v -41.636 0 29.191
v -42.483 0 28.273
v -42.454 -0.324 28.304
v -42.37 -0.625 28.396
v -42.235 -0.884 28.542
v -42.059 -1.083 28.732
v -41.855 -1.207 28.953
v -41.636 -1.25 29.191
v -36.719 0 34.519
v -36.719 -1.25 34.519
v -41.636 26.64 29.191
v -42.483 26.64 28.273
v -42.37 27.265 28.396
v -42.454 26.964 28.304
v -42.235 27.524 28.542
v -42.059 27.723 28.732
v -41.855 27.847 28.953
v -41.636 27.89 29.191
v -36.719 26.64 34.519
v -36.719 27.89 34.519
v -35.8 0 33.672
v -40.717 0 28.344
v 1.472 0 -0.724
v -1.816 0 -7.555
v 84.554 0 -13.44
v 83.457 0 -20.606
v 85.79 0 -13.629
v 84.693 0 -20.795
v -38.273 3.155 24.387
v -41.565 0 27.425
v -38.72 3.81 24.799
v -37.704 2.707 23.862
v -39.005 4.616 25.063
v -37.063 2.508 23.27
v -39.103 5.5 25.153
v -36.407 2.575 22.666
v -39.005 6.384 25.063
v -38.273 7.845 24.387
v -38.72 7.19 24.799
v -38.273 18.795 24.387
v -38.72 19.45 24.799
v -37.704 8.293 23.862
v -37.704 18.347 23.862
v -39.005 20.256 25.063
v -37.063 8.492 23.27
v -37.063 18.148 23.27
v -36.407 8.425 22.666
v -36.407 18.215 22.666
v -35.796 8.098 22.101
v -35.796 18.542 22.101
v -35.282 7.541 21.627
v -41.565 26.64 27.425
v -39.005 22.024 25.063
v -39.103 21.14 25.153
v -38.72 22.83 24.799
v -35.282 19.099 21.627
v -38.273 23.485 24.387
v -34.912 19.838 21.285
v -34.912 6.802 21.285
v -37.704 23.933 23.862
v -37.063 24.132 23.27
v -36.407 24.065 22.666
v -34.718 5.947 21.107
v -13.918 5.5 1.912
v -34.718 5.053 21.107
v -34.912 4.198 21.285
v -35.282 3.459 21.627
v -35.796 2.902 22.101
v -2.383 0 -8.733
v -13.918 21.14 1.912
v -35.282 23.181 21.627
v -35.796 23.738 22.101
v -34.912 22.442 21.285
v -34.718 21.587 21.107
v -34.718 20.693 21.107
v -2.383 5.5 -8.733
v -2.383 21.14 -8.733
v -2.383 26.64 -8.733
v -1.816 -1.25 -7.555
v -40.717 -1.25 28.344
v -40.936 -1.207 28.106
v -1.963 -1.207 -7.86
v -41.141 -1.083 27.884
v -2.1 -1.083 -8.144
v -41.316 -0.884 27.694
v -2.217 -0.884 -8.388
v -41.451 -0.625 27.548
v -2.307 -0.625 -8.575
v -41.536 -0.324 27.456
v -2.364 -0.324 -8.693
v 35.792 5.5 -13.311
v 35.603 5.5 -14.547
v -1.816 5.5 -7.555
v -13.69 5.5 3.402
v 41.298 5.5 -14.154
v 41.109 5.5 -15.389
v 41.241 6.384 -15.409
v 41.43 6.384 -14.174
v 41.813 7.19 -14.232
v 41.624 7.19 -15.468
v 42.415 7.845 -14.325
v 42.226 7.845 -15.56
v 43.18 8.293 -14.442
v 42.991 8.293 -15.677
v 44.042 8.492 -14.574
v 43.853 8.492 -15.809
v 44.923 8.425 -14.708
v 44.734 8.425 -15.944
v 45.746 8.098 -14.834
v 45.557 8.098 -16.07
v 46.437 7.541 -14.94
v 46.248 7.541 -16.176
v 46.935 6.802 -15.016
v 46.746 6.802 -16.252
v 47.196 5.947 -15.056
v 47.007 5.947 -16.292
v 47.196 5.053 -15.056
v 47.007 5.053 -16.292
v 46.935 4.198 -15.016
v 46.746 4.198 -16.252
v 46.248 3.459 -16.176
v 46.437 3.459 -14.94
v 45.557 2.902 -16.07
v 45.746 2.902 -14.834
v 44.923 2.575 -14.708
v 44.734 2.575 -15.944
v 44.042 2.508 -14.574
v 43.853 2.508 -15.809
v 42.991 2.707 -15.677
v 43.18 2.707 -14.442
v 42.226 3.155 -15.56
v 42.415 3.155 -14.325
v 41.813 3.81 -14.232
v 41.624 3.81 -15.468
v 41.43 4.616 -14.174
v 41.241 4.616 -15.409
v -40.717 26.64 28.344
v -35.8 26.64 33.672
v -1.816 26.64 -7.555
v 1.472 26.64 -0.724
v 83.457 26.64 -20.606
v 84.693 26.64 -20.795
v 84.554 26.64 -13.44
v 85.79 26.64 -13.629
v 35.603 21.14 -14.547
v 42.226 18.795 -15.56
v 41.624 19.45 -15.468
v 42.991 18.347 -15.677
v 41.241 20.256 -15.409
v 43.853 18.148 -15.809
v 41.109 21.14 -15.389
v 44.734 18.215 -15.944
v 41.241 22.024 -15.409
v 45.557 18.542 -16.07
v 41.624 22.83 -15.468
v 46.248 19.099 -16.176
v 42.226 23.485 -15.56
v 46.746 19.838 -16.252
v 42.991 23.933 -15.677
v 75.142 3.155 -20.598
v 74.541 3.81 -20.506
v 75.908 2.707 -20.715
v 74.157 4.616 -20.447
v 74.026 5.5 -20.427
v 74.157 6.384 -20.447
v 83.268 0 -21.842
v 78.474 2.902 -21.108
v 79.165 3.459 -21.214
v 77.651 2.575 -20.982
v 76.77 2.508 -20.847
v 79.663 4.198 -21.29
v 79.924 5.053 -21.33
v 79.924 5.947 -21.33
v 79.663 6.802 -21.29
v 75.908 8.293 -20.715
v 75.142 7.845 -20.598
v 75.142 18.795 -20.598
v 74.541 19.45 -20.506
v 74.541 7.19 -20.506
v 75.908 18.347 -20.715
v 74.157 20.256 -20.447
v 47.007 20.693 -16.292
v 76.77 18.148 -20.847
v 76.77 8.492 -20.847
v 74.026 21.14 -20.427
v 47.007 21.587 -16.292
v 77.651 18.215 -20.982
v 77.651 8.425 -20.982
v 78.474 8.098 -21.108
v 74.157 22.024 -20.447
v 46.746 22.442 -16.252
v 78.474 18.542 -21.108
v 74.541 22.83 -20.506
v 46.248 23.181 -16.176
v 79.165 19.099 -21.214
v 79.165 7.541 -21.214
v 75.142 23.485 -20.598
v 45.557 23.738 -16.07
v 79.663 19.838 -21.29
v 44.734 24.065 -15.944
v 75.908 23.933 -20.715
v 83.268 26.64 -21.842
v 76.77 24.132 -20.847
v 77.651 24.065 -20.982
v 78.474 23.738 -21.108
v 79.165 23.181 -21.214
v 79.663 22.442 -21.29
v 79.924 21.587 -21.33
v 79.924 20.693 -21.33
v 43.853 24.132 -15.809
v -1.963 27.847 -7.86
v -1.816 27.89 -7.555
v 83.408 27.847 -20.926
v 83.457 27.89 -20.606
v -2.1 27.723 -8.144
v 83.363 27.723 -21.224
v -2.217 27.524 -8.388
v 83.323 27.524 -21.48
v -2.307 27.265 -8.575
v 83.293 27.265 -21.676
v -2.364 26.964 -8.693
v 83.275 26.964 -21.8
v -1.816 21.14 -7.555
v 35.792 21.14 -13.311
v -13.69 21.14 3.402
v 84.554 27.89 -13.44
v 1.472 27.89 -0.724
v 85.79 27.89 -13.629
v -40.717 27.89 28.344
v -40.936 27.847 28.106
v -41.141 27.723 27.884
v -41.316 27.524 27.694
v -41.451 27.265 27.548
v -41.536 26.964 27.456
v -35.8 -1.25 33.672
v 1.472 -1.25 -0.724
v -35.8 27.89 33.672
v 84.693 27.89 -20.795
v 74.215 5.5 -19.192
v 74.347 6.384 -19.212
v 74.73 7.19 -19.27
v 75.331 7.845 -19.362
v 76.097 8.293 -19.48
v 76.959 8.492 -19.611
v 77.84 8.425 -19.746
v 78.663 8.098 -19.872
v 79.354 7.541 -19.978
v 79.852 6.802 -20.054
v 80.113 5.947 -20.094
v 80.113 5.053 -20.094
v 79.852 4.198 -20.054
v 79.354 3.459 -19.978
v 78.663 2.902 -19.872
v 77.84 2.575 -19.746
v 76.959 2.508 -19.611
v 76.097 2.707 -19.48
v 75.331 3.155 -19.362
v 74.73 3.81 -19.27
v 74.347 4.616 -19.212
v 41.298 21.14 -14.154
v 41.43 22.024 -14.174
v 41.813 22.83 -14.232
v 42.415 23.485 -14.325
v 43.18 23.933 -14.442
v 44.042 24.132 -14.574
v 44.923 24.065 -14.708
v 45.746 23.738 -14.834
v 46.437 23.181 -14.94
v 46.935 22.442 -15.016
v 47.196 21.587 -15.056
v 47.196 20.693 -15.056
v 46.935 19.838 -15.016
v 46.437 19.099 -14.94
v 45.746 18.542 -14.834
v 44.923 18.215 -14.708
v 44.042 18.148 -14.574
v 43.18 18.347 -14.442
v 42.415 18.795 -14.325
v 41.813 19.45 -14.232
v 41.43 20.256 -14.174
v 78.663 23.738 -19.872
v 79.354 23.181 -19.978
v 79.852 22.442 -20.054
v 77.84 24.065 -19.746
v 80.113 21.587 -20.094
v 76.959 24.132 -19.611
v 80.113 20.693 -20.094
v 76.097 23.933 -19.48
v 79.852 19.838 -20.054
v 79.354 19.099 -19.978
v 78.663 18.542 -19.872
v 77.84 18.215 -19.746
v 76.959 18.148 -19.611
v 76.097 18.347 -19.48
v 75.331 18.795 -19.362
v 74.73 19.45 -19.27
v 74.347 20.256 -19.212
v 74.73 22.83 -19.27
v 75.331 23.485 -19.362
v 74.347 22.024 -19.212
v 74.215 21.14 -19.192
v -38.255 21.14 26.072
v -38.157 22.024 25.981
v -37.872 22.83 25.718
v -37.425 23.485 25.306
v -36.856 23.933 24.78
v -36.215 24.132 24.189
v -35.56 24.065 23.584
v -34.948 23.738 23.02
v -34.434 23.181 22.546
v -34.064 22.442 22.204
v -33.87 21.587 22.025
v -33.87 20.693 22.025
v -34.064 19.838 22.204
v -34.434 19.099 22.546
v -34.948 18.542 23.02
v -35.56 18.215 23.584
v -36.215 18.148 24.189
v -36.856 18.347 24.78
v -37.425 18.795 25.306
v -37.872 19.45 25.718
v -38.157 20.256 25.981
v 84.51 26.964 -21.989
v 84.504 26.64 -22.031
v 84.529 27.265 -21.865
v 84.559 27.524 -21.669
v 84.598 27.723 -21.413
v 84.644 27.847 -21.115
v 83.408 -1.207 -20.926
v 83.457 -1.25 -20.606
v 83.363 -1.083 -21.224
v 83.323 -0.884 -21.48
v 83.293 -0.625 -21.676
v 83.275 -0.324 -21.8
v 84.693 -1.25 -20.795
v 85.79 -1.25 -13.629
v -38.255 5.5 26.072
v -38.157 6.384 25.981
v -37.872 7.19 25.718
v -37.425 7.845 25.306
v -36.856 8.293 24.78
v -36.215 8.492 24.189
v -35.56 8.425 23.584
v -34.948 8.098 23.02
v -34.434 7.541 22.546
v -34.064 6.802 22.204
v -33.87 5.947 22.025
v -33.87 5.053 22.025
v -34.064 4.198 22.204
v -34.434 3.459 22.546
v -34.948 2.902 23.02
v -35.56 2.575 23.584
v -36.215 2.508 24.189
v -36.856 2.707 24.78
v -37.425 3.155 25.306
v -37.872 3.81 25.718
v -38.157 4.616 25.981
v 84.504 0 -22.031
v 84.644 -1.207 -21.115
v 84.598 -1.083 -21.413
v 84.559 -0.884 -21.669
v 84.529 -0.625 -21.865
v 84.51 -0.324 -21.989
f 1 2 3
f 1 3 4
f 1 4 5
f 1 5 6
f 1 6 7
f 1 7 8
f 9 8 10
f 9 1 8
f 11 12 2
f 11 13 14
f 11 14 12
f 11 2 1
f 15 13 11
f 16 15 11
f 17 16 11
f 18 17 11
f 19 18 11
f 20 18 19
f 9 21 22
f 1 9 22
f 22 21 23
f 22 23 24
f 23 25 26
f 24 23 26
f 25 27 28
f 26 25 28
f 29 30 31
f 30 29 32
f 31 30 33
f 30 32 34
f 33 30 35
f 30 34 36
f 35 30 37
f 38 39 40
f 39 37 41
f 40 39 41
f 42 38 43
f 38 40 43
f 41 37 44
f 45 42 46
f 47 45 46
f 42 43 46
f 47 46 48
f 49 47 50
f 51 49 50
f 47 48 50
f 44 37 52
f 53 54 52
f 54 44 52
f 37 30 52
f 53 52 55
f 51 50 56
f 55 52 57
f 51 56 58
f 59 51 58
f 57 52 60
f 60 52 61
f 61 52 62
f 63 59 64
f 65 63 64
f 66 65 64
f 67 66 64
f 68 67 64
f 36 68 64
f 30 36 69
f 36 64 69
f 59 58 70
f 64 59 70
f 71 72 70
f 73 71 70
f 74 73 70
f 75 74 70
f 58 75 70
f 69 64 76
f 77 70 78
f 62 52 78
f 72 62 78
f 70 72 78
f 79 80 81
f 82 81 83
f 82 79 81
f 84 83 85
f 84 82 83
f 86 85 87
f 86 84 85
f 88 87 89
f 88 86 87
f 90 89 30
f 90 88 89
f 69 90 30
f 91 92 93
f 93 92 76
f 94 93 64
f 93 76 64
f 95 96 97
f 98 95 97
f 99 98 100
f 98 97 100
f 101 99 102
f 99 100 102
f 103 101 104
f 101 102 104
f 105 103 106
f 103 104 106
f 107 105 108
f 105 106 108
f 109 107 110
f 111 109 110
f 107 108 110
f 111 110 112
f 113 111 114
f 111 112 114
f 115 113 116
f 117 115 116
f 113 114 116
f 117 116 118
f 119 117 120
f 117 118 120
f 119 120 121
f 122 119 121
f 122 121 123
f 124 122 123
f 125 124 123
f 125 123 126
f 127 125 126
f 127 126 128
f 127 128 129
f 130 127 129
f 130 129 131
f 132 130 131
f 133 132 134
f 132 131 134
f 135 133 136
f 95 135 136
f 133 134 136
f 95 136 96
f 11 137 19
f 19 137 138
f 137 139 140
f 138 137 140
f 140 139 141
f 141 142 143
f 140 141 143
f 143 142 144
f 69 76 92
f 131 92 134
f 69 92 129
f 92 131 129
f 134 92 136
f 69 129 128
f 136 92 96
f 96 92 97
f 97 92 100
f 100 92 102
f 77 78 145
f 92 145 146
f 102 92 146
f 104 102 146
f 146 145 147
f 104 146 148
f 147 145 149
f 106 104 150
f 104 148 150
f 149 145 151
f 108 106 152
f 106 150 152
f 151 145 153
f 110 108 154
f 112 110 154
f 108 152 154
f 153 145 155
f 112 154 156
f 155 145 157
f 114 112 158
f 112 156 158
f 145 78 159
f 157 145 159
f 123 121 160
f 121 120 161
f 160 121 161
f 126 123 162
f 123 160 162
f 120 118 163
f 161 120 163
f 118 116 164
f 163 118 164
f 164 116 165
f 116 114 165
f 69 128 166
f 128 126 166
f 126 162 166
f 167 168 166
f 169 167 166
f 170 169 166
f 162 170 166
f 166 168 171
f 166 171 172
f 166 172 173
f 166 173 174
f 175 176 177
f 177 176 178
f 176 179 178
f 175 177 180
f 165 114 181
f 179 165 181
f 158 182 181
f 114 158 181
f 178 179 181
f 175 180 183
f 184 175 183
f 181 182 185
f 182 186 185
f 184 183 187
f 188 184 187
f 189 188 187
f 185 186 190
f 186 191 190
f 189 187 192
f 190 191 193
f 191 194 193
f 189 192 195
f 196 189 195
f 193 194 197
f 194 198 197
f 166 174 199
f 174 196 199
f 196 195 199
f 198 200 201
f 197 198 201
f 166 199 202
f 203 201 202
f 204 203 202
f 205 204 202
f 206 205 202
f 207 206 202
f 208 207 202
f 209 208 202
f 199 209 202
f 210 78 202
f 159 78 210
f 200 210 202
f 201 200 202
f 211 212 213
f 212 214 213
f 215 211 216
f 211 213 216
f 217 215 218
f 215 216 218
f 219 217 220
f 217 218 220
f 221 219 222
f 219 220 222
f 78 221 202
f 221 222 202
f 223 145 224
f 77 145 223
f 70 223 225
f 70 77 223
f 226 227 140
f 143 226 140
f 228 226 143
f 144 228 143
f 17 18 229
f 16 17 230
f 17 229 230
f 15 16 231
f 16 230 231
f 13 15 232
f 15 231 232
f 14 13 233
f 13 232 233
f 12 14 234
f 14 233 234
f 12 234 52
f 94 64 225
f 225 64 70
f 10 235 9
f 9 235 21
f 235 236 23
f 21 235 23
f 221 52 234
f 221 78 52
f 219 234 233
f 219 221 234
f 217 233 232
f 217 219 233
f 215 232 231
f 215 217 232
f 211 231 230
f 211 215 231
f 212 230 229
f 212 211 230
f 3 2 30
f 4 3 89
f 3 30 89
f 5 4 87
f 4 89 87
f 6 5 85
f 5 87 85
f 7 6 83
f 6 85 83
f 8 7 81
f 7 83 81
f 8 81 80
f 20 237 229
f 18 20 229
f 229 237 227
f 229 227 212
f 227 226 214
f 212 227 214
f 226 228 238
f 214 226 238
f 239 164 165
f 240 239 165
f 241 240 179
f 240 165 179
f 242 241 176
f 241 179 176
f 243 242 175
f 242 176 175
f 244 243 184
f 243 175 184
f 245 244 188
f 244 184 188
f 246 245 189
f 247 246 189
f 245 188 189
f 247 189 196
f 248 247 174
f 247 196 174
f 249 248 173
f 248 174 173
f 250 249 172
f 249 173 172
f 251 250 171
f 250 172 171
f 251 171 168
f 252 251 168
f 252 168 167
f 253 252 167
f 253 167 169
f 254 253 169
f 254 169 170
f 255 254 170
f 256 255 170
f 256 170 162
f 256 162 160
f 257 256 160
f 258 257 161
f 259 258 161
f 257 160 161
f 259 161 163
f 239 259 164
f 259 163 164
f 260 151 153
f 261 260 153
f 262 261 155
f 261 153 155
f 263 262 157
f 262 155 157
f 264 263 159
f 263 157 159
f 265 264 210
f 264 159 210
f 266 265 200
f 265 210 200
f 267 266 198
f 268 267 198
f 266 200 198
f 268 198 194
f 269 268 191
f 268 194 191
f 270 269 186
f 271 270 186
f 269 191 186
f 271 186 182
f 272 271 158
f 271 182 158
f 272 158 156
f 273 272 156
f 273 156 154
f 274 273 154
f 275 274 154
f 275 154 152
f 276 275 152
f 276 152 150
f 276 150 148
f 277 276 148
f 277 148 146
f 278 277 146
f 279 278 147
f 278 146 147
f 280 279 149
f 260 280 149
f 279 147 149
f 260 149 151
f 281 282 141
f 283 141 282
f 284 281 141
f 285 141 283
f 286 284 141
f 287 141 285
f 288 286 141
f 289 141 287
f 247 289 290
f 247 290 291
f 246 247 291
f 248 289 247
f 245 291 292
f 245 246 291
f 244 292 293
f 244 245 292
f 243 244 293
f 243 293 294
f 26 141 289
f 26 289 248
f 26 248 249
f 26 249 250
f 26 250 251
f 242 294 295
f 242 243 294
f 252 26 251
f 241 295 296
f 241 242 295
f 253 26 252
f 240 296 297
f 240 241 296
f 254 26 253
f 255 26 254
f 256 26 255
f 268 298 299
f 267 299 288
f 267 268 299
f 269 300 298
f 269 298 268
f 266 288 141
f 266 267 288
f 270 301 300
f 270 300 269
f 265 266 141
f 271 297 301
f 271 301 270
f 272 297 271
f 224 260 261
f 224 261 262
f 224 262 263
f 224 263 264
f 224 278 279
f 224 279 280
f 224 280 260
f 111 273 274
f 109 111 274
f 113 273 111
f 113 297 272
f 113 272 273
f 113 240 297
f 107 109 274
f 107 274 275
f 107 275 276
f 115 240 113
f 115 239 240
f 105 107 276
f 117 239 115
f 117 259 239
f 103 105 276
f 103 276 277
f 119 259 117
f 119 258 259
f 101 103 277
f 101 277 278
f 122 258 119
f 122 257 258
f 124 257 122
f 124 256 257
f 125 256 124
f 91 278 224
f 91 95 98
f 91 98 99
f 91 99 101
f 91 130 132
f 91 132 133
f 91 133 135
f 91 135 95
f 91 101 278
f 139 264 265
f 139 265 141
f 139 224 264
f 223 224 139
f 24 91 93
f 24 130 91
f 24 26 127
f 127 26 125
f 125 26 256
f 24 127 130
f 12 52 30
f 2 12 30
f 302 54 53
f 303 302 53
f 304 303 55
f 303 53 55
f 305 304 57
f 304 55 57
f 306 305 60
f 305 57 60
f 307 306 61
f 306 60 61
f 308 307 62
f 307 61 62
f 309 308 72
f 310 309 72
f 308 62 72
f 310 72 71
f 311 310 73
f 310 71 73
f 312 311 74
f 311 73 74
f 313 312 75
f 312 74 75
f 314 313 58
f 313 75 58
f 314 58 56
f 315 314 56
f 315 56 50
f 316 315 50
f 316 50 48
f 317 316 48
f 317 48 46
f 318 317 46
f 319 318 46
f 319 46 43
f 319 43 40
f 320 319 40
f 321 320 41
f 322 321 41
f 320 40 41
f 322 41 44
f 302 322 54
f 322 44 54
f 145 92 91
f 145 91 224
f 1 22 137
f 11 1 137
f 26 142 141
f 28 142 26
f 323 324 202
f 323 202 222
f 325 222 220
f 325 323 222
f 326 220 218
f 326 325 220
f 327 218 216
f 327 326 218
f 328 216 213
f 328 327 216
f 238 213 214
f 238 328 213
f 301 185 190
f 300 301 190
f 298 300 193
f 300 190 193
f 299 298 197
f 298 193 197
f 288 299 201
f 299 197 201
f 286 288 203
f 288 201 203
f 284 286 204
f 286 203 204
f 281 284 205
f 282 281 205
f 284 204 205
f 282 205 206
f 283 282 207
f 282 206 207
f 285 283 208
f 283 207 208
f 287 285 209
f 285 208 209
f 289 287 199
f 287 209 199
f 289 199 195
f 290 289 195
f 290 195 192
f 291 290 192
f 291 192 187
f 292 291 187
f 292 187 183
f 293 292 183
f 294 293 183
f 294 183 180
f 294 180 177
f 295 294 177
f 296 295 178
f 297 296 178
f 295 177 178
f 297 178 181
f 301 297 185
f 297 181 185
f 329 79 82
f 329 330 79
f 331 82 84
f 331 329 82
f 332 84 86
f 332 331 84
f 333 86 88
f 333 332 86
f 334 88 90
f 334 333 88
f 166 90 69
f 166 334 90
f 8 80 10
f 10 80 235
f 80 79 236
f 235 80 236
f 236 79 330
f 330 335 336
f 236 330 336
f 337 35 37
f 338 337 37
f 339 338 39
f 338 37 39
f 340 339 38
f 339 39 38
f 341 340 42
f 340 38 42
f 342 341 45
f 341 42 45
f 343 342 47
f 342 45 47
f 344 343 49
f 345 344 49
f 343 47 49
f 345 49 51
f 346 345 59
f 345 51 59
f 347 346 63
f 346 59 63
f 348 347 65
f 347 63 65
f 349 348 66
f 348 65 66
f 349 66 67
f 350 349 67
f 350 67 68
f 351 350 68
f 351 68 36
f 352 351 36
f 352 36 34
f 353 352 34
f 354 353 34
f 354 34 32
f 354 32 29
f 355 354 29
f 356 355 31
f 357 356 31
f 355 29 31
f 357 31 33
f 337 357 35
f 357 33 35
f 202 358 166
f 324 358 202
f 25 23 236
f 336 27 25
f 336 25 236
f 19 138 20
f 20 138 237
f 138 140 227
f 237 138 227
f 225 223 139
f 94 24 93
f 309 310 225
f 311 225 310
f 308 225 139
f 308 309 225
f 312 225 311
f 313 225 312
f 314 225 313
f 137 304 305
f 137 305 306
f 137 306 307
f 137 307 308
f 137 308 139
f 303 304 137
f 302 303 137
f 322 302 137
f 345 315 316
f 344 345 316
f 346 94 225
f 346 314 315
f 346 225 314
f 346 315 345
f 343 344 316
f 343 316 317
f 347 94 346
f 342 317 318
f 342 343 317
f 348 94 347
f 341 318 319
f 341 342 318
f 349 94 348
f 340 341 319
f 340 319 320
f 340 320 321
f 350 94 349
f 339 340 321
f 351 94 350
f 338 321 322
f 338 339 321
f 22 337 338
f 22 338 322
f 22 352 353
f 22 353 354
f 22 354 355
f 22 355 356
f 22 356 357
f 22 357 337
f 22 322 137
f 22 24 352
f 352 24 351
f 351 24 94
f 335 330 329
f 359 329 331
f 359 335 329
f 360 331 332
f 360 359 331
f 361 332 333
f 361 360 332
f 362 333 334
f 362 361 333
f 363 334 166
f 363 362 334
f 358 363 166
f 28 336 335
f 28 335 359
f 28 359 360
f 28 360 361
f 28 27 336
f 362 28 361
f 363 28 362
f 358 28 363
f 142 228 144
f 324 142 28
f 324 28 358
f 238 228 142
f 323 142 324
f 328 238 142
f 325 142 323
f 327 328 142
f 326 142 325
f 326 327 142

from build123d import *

# Parameters (mm, degrees)
BOSS_EXTRUDE1_DEPTH = 26.64
BOSS_EXTRUDE2_DEPTH = 1.25
BOSS_EXTRUDE3_DEPTH = 1.25
FILLET1_R           = 1.25
SKETCH4_R           = 3
CUT_EXTRUDE1_DEPTH  = 1.25
BOSS_EXTRUDE4_START = 1.25
BOSS_EXTRUDE4_DEPTH = 1.25
SKETCH6_R           = 3
CUT_EXTRUDE2_DEPTH  = 1.25
BOSS_EXTRUDE5_DEPTH = 1.25
SKETCH8_W           = 51.440869123
SKETCH8_H           = 15.64
CUT_EXTRUDE3_DEPTH  = 21.25


with BuildPart() as part:
    # Sketch1 → Boss-Extrude1 (new body)
    with BuildSketch(Plane(origin=(0, 0, 0), x_dir=(1, 0, 0), z_dir=(0, 1, 0))):
        Polygon((83.457182963, 20.606052526), (-1.816223719, 7.555013068), (-40.71695424, -28.343507726), (-41.564678823, -27.424887548), (-2.383097929, 8.732808661), (83.268073317, 21.841664739), align=None)
    extrude(amount=BOSS_EXTRUDE1_DEPTH)

    # Sketch2 → Boss-Extrude2 (add)
    with BuildSketch(Plane(origin=(0, 26.64, 0), x_dir=(1, 0, 0), z_dir=(0, 1, 0))):
        Polygon((83.268073317, 21.841664739), (84.55401891, 13.439501688), (1.471646699, 0.723798632), (-35.800151659, -33.671504758), (-41.564678823, -27.424887548), (-2.383097929, 8.732808661), align=None)
    extrude(amount=BOSS_EXTRUDE2_DEPTH)

    # Sketch3 → Boss-Extrude3 (add)
    with BuildSketch(Plane.XZ):
        Polygon((83.268073317, -21.841664739), (84.55401891, -13.439501688), (1.471646699, -0.723798632), (-35.800151659, 33.671504758), (-41.564678823, 27.424887548), (-2.383097929, -8.732808661), align=None)
    extrude(amount=BOSS_EXTRUDE3_DEPTH)

    # Fillet1
    fillet1_edges = [part.edges().sort_by_distance(p)[0] for p in [
        (40.442487694, 27.89, -15.2872367),
        (-21.973888376, 27.89, 9.346039443),
        (40.442487694, -1.25, -15.2872367),
        (-21.973888376, -1.25, 9.346039443),
    ]]
    fillet(fillet1_edges, radius=FILLET1_R)

    # Sketch4 → Cut-Extrude1 (cut)
    with BuildSketch(Plane(origin=(-1.360504034, 0, -8.889315992), x_dir=(-0.98848977068378, 0, 0.15128771679659964), z_dir=(-0.15128771679659964, 0, -0.98848977068378))):
        with Locations((-79.264014288, 21.14)):
            Circle(SKETCH4_R)
        with Locations((-45.964014288, 21.14)):
            Circle(SKETCH4_R)
        with Locations((-45.964014288, 5.5)):
            Circle(SKETCH4_R)
        with Locations((-79.264014288, 5.5)):
            Circle(SKETCH4_R)
    extrude(amount=-CUT_EXTRUDE1_DEPTH, mode=Mode.SUBTRACT)

    # Sketch5 → Boss-Extrude4 (add)
    with BuildSketch(Plane(origin=(84.628577351, 0, -12.952348747), x_dir=(-0.15128771679660272, 0, -0.9884897706837796), z_dir=(0.9884897706837796, 0, -0.15128771679660272)).offset(BOSS_EXTRUDE4_START)):
        with BuildLine():
            Line((0.492825475, -1.25), (7.742825475, -1.25))
            ThreePointArc((7.742825475, -1.25), (8.626708952, -0.883883476), (8.992825475, 0))
            Line((8.992825475, 0), (8.992825475, 26.64))
            ThreePointArc((8.992825475, 26.64), (8.626708952, 27.523883476), (7.742825475, 27.89))
            Line((7.742825475, 27.89), (0.492825475, 27.89))
            Line((0.492825475, 27.89), (0.492825475, 26.64))
            Line((0.492825475, 26.64), (7.742825475, 26.64))
            Line((7.742825475, 26.64), (7.742825475, 0))
            Line((7.742825475, 0), (0.492825475, 0))
            Line((0.492825475, 0), (0.492825475, -1.25))
        make_face()
    extrude(amount=-BOSS_EXTRUDE4_DEPTH)

    # Sketch6 → Cut-Extrude2 (cut)
    with BuildSketch(Plane(origin=(-5.448411315, 0, -5.904064448), x_dir=(-0.7348961423682216, 0, 0.6781796664102415), z_dir=(-0.6781796664102415, 0, -0.7348961423682216))):
        with Locations((42.794723214, 5.5)):
            Circle(SKETCH6_R)
        with Locations((42.794723214, 21.14)):
            Circle(SKETCH6_R)
    extrude(amount=-CUT_EXTRUDE2_DEPTH, mode=Mode.SUBTRACT)

    # Sketch7 → Boss-Extrude5 (add)
    with BuildSketch(Plane(origin=(-36.116267508, 0, 33.328951995), x_dir=(0.6781796664102416, 0, 0.7348961423682215), z_dir=(-0.7348961423682215, 0, 0.6781796664102416))):
        with BuildLine():
            Line((-8.033875955, 26.64), (-8.033875955, 0))
            ThreePointArc((-8.033875955, 0), (-7.667759432, -0.883883476), (-6.783875955, -1.25))
            Line((-6.783875955, -1.25), (0.466124045, -1.25))
            Line((0.466124045, -1.25), (0.466124045, 0))
            Line((0.466124045, 0), (-6.783875955, 0))
            Line((-6.783875955, 0), (-6.783875955, 26.64))
            Line((-6.783875955, 26.64), (0.466124045, 26.64))
            Line((0.466124045, 26.64), (0.466124045, 27.89))
            Line((0.466124045, 27.89), (-6.783875955, 27.89))
            ThreePointArc((-6.783875955, 27.89), (-7.667759432, 27.523883476), (-8.033875955, 26.64))
        make_face()
    extrude(amount=BOSS_EXTRUDE5_DEPTH)

    # Sketch8 → Cut-Extrude3 (cut)
    with BuildSketch(Plane(origin=(-1.360504034, 0, -8.889315992), x_dir=(-0.98848977068378, 0, 0.15128771679659964), z_dir=(-0.15128771679659964, 0, -0.98848977068378))):
        with Locations((-11.673373202, 13.32)):
            Rectangle(SKETCH8_W, SKETCH8_H)
    extrude(amount=-CUT_EXTRUDE3_DEPTH, mode=Mode.SUBTRACT)


solid = part.part
